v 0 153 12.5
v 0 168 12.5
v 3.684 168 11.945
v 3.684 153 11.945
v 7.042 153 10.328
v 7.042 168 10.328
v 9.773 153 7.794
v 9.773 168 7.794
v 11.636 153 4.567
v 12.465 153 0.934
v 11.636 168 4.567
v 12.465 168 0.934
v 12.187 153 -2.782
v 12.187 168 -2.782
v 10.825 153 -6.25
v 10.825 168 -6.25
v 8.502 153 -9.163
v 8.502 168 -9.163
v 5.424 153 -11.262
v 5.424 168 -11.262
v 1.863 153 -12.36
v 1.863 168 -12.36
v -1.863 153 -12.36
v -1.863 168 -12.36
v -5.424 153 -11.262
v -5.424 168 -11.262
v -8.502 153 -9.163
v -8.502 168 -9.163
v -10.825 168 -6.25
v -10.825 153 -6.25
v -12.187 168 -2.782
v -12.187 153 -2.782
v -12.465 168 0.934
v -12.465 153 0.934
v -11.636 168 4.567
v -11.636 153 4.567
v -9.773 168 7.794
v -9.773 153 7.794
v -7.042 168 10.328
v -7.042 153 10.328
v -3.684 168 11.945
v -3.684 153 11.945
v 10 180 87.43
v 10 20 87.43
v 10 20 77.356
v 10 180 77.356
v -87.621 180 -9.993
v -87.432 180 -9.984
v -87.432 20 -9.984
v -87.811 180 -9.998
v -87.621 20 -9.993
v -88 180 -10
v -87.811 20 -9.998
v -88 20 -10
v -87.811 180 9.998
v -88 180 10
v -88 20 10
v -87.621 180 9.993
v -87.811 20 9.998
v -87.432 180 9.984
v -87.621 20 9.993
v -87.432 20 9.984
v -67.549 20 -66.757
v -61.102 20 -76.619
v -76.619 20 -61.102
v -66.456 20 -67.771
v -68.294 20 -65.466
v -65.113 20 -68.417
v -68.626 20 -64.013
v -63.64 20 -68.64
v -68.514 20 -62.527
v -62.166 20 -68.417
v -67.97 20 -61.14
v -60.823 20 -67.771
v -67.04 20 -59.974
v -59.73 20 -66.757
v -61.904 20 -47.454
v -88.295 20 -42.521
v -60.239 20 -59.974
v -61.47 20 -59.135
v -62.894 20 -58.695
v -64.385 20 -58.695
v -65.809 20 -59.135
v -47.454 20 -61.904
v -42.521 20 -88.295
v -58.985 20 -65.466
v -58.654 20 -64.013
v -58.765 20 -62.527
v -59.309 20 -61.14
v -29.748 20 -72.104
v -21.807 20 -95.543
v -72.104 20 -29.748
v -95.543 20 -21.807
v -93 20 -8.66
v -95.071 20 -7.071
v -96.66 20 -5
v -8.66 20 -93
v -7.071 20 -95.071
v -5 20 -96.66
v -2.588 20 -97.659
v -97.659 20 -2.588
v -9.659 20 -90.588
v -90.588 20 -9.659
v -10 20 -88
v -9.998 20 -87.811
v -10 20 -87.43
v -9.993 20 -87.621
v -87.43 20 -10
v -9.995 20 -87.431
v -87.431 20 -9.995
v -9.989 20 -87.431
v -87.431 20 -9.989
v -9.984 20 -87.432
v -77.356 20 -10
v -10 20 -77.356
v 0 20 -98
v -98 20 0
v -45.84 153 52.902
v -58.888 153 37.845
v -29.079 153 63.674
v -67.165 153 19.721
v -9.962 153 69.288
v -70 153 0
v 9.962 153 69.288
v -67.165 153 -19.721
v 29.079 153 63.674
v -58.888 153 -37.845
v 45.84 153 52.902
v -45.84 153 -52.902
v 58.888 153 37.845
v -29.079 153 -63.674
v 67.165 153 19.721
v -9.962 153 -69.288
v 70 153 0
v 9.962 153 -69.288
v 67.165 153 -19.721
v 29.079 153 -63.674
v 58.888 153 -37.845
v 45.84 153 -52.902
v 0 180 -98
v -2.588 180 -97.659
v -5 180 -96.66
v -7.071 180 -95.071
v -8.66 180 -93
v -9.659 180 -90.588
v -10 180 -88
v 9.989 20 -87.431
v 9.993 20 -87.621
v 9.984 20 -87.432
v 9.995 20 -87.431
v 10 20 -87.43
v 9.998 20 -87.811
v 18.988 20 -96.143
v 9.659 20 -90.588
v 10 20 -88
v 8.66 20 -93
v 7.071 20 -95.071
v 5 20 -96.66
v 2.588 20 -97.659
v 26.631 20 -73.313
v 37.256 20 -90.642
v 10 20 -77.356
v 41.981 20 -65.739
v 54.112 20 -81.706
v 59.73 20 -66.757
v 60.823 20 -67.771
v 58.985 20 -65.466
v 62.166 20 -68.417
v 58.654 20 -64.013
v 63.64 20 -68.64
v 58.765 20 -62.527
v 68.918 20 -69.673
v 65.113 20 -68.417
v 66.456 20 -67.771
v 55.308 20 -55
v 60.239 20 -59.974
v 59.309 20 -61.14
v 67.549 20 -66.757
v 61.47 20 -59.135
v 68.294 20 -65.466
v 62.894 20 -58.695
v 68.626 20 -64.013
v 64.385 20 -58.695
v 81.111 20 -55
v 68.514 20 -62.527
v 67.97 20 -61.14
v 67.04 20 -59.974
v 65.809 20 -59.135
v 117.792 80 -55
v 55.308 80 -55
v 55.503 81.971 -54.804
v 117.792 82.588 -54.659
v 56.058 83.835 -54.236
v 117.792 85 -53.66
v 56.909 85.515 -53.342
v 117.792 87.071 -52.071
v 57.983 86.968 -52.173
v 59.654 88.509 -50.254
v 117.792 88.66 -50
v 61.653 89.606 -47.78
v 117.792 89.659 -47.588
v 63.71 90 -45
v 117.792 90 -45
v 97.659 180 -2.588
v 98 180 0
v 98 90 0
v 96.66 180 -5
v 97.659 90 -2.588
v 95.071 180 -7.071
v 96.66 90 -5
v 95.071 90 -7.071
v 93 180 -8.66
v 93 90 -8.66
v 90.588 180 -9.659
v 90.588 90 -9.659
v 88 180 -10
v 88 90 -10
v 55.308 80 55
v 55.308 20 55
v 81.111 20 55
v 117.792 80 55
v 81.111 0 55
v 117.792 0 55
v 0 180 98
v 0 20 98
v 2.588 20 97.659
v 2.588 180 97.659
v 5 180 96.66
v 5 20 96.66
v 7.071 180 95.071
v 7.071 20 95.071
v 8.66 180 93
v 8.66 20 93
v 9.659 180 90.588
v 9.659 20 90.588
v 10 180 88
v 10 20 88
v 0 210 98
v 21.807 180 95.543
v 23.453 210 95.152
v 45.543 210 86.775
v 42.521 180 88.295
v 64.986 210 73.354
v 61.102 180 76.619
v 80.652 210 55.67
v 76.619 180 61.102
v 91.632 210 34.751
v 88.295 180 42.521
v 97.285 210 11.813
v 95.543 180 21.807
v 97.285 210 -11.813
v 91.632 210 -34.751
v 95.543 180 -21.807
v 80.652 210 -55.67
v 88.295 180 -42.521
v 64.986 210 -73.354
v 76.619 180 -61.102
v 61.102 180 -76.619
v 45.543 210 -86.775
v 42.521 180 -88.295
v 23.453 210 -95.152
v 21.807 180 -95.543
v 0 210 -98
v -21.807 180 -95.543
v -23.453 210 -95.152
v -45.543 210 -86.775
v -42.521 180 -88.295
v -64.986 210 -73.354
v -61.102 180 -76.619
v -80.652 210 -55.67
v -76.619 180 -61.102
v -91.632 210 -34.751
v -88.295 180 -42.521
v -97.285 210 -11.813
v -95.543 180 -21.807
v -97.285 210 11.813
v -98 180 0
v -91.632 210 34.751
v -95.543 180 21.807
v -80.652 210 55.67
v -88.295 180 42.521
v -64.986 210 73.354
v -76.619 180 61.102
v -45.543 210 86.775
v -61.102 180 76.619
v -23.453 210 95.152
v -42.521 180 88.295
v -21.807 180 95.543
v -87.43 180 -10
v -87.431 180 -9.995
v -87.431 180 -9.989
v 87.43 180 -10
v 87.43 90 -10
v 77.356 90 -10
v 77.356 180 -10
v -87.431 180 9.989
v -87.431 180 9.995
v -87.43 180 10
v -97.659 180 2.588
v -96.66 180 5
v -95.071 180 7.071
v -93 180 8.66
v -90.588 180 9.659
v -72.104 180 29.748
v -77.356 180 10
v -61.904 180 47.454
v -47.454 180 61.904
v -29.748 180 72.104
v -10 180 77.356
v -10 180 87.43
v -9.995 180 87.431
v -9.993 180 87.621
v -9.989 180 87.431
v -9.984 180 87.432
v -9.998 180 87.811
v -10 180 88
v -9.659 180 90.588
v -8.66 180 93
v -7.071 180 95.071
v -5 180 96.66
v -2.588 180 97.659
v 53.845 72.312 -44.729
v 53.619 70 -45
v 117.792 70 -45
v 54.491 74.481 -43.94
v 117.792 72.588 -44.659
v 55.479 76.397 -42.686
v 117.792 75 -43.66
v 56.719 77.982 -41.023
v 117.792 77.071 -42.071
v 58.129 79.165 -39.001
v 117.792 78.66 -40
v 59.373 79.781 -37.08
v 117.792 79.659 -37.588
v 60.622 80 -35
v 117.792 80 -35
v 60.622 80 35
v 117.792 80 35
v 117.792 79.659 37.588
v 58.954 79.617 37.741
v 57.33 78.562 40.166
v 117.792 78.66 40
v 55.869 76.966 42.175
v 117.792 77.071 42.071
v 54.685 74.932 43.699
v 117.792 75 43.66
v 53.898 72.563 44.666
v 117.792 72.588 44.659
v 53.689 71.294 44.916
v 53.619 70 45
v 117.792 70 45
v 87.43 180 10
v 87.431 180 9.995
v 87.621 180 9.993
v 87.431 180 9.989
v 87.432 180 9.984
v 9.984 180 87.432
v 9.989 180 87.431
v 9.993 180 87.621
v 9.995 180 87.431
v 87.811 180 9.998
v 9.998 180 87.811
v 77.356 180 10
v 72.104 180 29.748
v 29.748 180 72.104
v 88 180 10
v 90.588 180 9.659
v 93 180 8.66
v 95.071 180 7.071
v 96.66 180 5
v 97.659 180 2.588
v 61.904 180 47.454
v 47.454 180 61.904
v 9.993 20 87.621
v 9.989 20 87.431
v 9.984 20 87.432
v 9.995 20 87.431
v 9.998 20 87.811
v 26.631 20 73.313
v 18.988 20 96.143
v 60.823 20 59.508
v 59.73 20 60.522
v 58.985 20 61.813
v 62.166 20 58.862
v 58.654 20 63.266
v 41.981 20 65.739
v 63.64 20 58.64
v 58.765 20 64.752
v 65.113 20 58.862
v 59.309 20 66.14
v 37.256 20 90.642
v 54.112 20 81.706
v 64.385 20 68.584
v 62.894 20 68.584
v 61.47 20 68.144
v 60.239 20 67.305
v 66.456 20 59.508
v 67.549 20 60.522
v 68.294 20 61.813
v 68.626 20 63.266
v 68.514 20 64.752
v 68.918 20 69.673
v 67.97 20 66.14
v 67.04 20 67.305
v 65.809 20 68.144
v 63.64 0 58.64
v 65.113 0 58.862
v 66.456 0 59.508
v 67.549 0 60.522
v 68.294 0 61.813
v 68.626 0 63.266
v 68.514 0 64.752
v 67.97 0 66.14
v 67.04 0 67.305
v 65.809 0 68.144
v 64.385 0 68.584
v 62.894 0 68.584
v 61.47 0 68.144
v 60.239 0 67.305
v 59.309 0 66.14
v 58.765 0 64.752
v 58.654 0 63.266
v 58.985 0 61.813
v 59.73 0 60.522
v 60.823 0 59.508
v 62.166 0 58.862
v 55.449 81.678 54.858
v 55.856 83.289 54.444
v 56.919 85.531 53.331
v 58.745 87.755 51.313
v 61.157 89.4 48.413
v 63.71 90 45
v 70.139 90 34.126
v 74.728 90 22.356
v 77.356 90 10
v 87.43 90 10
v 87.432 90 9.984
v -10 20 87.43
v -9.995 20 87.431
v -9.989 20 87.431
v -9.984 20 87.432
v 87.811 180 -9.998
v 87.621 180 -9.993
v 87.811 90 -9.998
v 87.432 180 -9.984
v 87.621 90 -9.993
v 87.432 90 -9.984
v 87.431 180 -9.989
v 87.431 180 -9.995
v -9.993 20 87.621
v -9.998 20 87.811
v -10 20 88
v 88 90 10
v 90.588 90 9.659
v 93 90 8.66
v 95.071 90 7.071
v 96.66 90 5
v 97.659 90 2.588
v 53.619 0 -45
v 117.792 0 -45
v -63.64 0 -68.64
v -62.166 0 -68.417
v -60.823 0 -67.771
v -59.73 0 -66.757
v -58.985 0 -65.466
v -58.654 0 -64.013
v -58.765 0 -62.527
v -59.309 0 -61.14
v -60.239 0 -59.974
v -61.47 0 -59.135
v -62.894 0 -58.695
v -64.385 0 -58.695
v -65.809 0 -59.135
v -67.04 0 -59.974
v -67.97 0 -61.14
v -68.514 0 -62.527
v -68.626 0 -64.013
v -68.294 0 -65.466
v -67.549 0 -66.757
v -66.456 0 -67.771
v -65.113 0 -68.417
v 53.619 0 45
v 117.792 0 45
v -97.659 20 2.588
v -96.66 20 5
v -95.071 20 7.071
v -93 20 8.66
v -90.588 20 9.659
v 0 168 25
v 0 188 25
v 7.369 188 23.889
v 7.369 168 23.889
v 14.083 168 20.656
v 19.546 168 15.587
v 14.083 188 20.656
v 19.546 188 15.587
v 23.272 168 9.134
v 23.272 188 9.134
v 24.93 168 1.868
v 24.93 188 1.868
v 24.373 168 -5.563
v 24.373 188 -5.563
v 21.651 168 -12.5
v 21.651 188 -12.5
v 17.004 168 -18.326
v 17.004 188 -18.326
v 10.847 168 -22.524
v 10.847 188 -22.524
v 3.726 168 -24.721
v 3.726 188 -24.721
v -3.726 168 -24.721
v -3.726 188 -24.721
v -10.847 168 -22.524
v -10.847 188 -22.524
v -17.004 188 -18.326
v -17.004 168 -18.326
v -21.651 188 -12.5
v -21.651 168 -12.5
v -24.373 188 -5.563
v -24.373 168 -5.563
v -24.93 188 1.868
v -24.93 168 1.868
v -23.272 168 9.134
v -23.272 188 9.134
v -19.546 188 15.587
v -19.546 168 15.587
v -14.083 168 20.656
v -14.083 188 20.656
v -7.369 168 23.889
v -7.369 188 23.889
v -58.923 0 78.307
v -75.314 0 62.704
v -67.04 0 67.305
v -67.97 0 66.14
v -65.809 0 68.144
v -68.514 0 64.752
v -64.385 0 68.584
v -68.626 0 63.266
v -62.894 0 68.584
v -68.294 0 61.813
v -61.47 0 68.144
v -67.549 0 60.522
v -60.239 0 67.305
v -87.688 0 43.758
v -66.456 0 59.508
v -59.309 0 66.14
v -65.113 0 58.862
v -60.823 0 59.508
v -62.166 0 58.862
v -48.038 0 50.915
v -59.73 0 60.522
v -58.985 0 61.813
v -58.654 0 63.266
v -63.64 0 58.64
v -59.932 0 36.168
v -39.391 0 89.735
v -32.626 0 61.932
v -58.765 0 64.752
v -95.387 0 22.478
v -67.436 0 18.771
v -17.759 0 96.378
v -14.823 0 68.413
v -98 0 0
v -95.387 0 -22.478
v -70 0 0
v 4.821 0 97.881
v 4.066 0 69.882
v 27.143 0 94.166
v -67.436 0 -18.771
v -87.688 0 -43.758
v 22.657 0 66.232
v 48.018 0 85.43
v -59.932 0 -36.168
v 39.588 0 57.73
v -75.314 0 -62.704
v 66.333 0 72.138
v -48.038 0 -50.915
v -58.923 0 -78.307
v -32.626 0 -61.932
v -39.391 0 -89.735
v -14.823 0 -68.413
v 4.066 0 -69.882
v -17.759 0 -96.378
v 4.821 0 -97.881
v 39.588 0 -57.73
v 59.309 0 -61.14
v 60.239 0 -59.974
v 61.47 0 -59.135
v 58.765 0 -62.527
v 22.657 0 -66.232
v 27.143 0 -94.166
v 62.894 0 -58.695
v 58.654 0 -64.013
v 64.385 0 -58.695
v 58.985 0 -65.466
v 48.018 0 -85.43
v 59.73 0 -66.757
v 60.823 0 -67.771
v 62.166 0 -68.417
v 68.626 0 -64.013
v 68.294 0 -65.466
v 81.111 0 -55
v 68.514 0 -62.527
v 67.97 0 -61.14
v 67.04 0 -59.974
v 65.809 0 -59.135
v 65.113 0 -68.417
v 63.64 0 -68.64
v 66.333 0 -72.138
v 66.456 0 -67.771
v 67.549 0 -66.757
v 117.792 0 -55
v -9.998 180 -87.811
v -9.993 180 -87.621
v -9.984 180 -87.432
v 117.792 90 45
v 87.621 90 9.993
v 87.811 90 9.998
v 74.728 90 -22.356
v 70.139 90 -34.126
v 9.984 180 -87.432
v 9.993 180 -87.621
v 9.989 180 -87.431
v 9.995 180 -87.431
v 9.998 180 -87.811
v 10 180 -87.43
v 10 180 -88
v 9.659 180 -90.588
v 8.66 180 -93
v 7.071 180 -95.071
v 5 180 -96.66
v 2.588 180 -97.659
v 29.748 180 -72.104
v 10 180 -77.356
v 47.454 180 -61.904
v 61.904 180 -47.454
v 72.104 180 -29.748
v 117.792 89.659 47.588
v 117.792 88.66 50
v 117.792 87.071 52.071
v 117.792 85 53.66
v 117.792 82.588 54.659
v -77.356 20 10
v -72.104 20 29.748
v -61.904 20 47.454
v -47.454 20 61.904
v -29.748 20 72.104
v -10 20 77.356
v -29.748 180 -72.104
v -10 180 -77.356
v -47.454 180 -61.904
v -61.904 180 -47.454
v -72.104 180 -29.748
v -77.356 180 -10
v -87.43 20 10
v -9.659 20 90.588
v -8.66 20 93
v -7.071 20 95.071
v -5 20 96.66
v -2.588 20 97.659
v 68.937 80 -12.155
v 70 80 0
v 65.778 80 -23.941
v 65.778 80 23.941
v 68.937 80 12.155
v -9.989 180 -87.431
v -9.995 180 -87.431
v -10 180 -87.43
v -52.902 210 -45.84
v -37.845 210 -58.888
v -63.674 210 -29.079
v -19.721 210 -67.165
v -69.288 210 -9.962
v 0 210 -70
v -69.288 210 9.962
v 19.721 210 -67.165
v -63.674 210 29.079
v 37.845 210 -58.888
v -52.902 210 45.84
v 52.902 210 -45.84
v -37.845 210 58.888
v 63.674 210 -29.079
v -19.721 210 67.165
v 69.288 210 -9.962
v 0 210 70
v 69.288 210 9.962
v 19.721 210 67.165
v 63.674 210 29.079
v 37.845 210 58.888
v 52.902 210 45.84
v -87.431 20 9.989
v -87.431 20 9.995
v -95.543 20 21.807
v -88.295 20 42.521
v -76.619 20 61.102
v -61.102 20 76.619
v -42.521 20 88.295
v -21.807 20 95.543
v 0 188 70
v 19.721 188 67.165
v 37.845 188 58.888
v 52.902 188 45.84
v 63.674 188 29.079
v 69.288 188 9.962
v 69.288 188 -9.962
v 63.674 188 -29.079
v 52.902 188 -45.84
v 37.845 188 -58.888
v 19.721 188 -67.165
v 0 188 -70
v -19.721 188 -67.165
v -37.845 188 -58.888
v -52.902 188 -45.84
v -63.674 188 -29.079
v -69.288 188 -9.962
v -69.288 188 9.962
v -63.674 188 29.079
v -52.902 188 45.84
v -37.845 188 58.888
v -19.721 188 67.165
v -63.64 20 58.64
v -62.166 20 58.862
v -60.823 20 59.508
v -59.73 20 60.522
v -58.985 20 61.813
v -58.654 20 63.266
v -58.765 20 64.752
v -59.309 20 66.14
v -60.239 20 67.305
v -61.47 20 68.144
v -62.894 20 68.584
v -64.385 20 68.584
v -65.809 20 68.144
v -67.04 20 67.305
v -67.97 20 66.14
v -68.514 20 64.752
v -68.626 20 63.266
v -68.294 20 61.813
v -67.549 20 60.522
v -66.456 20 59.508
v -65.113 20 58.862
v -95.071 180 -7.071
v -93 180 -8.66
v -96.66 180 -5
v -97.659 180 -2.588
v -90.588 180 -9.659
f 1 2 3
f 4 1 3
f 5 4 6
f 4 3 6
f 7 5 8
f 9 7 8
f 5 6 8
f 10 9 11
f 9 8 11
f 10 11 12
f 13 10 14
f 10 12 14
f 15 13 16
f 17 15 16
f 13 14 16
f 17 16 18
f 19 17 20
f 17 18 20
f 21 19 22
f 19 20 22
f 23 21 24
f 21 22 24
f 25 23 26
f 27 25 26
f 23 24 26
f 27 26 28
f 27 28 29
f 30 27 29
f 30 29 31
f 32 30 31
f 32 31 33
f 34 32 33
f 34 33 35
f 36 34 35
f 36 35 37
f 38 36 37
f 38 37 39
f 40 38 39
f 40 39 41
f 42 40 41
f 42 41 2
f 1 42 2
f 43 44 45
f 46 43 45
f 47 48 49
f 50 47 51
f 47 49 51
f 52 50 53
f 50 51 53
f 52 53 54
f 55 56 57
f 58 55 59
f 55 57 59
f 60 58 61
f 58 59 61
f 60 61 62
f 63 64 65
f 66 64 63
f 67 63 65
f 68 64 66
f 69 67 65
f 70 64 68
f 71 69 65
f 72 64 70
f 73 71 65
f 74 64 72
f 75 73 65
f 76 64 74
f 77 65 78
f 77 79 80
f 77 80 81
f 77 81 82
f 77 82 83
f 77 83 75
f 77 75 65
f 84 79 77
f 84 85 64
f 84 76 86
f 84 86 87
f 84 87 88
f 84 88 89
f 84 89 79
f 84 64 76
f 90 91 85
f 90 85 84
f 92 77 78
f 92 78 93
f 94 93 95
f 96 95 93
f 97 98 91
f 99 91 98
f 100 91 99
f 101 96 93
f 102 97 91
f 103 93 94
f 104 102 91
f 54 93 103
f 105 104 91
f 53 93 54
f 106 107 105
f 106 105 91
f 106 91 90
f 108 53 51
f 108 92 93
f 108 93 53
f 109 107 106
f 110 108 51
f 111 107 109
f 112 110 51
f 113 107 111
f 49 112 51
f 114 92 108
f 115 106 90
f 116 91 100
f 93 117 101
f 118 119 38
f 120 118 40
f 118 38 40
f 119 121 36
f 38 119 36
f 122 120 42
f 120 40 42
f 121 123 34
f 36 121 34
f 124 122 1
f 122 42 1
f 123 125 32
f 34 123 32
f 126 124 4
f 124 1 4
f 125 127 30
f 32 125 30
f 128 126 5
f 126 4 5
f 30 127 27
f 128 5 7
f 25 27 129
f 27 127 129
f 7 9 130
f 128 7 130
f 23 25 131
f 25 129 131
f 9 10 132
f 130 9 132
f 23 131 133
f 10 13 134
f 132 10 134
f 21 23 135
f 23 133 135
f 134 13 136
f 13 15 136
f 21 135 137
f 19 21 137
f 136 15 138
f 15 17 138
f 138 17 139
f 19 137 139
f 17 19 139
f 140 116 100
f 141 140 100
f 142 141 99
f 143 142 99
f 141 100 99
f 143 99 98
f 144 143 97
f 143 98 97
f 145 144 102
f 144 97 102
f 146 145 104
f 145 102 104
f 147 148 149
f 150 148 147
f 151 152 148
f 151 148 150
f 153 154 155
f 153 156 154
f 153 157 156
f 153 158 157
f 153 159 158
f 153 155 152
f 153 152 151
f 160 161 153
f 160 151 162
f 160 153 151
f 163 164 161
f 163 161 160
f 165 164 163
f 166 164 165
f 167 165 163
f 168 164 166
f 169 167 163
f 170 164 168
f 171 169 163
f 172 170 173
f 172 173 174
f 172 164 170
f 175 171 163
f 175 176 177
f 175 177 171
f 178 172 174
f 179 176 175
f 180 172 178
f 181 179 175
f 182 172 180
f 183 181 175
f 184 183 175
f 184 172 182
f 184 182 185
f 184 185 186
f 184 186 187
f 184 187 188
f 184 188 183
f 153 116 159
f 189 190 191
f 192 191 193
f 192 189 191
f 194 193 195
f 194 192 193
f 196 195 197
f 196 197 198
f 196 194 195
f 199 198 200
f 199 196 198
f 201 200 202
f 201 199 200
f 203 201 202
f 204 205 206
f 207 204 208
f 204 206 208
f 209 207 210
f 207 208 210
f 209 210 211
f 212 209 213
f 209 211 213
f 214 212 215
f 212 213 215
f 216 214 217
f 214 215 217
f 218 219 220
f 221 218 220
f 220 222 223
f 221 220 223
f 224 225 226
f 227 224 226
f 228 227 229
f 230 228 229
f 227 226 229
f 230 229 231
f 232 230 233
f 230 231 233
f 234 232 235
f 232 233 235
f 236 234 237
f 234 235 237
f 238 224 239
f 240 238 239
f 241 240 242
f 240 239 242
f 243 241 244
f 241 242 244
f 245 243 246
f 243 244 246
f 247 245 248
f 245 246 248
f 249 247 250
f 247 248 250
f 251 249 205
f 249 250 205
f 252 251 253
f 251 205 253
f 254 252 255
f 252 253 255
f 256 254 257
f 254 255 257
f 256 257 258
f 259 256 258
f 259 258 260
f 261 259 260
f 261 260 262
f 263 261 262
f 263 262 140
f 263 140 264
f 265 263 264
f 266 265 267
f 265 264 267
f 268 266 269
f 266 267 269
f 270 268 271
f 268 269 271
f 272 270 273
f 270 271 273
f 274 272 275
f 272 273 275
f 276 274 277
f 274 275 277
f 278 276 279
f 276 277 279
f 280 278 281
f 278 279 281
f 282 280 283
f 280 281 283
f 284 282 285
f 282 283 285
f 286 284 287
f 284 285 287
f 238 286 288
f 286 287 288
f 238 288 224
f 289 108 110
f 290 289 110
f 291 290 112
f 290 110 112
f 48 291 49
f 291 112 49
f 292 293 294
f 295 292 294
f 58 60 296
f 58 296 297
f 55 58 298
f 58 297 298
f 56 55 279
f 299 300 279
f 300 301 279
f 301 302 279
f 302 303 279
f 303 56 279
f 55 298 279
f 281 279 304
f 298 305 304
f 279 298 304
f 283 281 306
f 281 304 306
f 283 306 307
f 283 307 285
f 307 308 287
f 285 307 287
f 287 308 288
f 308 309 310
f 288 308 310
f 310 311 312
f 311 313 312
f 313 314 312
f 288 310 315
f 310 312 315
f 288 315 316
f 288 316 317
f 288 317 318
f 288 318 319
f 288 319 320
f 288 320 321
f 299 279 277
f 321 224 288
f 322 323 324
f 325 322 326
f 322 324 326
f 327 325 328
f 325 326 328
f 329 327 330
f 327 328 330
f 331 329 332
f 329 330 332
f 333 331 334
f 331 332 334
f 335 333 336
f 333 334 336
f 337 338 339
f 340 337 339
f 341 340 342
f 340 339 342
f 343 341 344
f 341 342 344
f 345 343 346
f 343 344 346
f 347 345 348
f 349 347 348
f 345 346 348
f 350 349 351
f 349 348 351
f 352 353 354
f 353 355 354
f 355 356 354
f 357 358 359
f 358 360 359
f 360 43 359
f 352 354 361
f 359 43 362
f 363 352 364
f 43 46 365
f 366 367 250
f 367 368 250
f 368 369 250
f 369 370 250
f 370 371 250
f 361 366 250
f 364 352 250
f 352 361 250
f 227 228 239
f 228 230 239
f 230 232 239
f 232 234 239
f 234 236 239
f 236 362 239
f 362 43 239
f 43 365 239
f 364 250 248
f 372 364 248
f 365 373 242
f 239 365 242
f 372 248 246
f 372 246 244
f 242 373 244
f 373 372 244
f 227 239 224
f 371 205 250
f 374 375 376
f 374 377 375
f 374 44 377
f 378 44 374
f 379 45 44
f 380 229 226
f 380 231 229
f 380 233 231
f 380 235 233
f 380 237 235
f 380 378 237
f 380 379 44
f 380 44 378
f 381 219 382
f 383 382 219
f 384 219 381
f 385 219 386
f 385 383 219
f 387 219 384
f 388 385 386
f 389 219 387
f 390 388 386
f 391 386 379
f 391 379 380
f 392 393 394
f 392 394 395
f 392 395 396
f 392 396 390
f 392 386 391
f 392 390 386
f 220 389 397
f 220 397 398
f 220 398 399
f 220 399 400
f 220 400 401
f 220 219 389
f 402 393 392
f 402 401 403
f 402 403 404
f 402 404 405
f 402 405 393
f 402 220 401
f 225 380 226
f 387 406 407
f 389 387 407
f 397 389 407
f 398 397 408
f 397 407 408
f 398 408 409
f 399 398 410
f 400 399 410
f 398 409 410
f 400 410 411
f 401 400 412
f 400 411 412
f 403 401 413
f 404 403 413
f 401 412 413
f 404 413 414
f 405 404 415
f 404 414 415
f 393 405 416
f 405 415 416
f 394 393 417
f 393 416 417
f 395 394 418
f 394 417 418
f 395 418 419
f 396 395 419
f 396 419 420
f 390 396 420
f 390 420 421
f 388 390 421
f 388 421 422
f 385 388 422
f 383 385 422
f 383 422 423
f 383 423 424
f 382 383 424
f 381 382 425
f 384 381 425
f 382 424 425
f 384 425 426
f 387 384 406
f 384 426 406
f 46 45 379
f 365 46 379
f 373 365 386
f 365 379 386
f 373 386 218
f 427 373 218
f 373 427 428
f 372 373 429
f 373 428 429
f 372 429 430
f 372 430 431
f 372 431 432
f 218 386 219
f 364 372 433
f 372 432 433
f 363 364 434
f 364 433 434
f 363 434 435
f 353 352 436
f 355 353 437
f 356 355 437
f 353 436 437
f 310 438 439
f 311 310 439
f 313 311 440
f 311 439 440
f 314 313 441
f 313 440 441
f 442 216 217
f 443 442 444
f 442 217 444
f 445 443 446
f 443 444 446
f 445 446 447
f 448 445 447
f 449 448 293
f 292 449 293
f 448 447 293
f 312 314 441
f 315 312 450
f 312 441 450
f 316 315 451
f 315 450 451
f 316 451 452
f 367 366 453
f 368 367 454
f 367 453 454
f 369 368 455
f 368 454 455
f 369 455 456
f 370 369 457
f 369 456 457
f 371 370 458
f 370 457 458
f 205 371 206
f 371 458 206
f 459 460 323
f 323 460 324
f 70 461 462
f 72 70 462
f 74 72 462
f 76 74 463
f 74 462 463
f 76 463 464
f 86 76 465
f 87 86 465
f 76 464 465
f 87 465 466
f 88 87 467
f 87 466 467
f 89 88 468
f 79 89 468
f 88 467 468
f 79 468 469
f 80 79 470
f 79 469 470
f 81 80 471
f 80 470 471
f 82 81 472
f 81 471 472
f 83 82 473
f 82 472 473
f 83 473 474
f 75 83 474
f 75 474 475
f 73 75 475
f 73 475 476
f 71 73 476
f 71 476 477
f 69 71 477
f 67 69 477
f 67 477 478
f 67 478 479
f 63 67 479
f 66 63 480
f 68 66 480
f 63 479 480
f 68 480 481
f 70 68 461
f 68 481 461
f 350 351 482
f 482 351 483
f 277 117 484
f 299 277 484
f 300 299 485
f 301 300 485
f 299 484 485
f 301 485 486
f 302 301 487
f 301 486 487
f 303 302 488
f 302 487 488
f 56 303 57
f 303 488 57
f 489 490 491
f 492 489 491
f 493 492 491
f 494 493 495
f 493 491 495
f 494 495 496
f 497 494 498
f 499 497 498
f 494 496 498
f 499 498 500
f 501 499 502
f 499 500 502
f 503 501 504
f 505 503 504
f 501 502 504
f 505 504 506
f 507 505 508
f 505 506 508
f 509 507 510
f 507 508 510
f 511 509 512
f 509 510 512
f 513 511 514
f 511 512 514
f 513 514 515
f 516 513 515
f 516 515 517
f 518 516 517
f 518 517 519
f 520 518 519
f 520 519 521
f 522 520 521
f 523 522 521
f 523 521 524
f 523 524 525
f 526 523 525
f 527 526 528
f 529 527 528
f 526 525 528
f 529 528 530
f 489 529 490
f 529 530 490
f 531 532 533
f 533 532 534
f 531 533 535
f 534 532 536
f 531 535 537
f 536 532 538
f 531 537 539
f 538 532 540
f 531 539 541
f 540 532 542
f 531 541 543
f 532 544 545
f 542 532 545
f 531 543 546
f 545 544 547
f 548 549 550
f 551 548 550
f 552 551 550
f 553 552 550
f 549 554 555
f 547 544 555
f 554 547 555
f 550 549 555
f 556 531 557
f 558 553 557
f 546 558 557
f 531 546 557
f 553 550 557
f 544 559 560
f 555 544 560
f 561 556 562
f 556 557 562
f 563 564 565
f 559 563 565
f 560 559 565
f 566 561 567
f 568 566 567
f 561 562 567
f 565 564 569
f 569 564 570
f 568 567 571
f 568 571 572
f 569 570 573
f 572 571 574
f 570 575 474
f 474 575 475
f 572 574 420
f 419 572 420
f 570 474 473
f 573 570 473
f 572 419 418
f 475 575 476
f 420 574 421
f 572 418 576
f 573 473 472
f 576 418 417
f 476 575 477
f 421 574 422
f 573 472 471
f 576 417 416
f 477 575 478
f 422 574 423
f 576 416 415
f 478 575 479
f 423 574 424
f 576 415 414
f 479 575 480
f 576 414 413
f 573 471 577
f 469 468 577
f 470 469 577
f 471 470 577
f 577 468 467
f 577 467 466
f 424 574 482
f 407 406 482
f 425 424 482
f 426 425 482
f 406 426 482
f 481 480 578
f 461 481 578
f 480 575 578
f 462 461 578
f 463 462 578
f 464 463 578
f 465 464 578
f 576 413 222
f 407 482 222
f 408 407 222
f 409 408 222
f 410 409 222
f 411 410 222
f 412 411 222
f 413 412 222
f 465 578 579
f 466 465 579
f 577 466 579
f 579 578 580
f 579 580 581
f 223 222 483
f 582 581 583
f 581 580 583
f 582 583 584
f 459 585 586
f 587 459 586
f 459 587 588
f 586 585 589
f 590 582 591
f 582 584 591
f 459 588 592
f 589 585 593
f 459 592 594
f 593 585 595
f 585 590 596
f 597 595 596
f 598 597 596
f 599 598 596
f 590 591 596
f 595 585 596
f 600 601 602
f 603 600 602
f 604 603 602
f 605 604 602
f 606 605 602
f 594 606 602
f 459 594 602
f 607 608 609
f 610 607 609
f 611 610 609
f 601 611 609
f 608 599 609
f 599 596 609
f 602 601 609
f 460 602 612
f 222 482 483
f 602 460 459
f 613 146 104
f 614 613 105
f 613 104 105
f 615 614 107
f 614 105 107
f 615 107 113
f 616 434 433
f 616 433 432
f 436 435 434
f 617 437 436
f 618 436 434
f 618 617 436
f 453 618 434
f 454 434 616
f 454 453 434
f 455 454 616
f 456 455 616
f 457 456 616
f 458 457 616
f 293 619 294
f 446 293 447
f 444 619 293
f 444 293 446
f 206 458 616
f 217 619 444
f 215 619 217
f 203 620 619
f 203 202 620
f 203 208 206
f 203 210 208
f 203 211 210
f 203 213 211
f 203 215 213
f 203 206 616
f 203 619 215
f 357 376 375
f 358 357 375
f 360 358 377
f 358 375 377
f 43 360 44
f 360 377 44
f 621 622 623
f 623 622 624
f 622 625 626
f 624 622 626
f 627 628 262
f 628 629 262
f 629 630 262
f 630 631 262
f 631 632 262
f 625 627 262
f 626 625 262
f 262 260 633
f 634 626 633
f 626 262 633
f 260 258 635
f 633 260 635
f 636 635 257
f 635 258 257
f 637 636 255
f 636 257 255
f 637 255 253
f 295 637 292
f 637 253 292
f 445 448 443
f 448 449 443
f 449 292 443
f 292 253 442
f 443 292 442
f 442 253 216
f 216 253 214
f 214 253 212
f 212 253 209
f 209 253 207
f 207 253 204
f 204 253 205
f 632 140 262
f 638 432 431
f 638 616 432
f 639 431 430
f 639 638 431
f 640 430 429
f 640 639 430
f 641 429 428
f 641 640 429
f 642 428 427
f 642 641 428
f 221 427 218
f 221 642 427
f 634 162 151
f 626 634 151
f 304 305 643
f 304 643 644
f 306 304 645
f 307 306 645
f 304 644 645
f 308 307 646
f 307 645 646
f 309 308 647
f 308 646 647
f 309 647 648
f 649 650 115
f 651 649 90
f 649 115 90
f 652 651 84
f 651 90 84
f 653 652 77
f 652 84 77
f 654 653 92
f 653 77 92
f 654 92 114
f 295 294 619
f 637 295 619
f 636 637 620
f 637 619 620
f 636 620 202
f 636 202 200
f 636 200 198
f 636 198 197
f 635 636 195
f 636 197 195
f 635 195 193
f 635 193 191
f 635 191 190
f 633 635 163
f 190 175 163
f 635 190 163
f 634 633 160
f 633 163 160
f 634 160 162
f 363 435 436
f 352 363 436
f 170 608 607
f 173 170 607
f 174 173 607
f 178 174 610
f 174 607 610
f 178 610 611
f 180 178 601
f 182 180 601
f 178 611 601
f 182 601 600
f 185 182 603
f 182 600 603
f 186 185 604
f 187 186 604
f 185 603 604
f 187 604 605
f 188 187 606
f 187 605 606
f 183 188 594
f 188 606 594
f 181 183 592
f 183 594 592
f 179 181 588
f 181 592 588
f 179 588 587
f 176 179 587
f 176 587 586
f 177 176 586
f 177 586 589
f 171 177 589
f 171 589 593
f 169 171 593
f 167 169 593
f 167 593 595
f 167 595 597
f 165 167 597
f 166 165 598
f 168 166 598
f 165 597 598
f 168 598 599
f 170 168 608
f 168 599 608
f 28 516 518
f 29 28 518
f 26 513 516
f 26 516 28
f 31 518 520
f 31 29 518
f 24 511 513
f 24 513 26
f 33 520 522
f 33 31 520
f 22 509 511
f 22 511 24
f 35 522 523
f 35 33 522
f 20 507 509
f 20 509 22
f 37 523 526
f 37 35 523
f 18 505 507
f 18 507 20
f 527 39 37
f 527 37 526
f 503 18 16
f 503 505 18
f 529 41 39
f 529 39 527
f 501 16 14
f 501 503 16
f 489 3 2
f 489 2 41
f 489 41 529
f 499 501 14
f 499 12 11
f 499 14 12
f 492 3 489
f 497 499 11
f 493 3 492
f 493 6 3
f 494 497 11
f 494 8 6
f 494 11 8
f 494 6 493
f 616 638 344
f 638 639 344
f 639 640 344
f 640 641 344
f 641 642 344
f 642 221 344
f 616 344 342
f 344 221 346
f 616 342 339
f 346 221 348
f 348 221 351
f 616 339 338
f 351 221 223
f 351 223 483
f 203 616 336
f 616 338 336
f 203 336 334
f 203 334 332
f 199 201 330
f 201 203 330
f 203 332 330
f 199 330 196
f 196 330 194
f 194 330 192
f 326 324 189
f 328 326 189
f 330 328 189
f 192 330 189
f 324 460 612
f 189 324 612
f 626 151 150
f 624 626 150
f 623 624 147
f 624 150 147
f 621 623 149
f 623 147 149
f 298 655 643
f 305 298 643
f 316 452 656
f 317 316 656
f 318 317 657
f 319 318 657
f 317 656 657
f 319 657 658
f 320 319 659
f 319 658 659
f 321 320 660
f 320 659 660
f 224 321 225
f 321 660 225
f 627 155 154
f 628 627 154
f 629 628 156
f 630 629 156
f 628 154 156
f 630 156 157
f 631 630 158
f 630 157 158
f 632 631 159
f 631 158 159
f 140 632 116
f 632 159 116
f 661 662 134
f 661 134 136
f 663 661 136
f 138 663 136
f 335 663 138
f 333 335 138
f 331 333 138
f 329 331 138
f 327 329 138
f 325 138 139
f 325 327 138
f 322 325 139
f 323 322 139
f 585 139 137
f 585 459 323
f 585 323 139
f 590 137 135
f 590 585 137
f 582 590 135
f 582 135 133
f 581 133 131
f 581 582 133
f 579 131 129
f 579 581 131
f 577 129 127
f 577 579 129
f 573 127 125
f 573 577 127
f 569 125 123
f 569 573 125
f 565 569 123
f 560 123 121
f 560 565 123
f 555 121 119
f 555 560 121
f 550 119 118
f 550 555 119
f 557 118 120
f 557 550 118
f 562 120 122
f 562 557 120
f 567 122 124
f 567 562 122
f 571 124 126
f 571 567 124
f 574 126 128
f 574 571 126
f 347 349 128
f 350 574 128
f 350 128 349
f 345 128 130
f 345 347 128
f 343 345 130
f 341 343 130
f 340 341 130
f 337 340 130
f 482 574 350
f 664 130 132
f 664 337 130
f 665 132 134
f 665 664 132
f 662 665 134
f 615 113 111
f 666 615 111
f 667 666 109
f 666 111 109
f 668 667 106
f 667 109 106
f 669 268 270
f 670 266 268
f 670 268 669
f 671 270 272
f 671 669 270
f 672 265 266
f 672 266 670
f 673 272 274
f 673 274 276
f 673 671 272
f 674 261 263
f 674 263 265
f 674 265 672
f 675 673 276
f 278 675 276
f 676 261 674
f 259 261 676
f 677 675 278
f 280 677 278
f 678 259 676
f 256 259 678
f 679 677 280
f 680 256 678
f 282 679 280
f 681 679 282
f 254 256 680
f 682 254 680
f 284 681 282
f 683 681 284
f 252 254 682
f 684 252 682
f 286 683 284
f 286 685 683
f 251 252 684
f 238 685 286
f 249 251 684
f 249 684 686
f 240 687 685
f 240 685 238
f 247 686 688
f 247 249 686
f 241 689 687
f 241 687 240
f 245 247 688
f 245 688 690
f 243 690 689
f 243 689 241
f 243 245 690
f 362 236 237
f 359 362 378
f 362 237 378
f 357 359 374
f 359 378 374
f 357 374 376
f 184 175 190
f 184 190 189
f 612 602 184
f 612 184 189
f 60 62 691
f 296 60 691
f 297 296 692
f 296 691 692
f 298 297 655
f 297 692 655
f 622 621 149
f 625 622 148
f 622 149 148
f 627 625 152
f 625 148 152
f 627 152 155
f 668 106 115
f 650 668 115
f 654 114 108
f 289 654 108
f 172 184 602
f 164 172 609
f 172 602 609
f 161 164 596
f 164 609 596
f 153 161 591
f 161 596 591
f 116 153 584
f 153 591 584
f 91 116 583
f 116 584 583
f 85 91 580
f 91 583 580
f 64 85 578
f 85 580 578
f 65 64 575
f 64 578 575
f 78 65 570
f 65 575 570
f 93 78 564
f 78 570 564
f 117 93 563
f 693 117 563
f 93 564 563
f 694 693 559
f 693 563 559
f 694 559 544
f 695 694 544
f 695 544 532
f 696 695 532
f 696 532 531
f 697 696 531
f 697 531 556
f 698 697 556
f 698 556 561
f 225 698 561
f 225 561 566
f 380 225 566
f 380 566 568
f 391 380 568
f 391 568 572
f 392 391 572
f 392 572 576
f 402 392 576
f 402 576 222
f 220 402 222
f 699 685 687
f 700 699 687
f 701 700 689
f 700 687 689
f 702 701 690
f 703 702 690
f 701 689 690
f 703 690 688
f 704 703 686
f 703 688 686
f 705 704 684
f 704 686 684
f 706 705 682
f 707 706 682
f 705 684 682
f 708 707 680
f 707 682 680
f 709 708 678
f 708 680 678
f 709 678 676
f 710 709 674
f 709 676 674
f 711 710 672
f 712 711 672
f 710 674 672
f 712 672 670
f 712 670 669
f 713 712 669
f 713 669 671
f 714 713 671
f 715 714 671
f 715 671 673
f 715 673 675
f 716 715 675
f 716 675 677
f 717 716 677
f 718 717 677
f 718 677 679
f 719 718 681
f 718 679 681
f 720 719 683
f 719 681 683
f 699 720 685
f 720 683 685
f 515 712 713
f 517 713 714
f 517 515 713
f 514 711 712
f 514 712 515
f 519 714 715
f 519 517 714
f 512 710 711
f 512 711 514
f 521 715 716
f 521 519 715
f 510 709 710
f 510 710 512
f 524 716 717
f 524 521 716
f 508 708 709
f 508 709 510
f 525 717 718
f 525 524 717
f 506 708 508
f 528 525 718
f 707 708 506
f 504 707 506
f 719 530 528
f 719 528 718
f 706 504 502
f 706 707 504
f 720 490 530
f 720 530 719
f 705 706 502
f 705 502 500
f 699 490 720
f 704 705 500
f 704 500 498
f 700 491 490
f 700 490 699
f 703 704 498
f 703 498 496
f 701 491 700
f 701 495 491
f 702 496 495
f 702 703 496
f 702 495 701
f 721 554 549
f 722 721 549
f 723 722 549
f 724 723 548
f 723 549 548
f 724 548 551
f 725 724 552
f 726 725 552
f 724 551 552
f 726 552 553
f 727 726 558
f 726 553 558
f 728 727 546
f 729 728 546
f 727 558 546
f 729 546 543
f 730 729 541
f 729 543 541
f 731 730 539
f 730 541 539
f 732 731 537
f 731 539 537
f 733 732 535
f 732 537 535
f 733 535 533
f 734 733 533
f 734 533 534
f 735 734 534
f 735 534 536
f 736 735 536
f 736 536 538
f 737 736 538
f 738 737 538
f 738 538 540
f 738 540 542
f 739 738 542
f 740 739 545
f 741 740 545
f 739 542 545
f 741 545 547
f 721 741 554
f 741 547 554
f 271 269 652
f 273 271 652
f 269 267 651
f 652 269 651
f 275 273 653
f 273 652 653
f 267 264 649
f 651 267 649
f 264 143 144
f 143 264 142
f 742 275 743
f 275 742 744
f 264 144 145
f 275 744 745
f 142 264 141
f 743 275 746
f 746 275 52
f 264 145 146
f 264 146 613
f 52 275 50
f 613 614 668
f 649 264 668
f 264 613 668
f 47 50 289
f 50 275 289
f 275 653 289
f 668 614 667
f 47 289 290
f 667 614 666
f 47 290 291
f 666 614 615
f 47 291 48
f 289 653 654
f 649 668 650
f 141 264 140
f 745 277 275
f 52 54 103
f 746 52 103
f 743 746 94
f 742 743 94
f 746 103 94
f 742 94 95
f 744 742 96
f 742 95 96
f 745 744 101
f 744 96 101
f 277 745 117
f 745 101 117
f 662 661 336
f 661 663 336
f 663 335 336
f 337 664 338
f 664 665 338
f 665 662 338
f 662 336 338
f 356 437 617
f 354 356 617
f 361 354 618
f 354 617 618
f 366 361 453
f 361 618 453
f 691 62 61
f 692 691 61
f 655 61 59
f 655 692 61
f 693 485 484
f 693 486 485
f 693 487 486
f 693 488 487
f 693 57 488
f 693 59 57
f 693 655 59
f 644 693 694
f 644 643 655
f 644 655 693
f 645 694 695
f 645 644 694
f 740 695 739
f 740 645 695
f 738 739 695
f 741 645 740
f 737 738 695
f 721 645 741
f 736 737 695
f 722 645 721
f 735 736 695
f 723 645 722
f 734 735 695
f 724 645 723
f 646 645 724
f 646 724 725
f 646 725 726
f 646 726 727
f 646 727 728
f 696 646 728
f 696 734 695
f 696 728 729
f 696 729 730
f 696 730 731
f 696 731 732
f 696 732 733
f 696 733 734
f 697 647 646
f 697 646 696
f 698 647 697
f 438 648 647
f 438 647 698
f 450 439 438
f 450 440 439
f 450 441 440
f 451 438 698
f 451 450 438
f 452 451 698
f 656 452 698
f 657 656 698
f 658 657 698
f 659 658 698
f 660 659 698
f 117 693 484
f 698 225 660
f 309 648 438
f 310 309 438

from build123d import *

# Parameters (mm, degrees)
SKETCH1_R               = 98
SKETCH1_R_2             = 78
BOSS_EXTRUDE1_DEPTH     = 20
SKETCH1_3_R             = 78
BOSS_EXTRUDE2_DEPTH     = 210
BOSS_EXTRUDE3_DEPTH     = 160
CIRPATTERN1_COUNT       = 4
BOSS_EXTRUDE4_START     = -30
SKETCH3_R               = 98
SKETCH3_R_2             = 78
BOSS_EXTRUDE4_DEPTH     = 30
SKETCH4_R               = 70
CUT_EXTRUDE1_DEPTH      = 22
SKETCH5_R               = 25
CUT_EXTRUDE2_DEPTH      = 20
CUT_EXTRUDE3_START      = -188
CUT_EXTRUDE3_OUTLINE_R  = 70
CUT_EXTRUDE3_DEPTH      = 153
SKETCH7_R               = 12.5
CUT_EXTRUDE4_DEPTH      = 218.788888605
BOSS_EXTRUDE6_DEPTH     = 90
FILLET1_R               = 10
CUT_EXTRUDE5_REACH      = 318.655
CUT_EXTRUDE5_END_RADIUS = 70
SKETCH12_R              = 5
CUT_EXTRUDE6_DEPTH      = 20


# Read off the part's stored shape, not the designer's step: Cut-Extrude3
with BuildPart() as part:
    # Sketch1 → Boss-Extrude1 (new body)
    # profile 1 of 2: a face of its own
    with BuildSketch(Plane(origin=(0, 0, 0), x_dir=(1, 0, 0), z_dir=(0, 1, 0))):
        with Locations(Location((0, 0, 0), (0, 0, 270))):
            Circle(SKETCH1_R)
        Circle(SKETCH1_R_2, mode=Mode.SUBTRACT)
    # profile 2 of 2: a face of its own
    with BuildSketch(Plane(origin=(0, 0, 0), x_dir=(1, 0, 0), z_dir=(0, 1, 0))):
        Circle(SKETCH1_R_2)
    extrude(amount=BOSS_EXTRUDE1_DEPTH)

    # Sketch1<3> → Boss-Extrude2 (add)
    with BuildSketch(Plane(origin=(0, 0, 0), x_dir=(1, 0, 0), z_dir=(0, 1, 0))):
        with Locations(Location((0, 0, 0), (0, 0, 270))):
            Circle(SKETCH1_3_R)
    extrude(amount=BOSS_EXTRUDE2_DEPTH)

    # Sketch2 → Boss-Extrude3 (add)
    with BuildSketch(Plane(origin=(0, 20, 0), x_dir=(1, 0, 0), z_dir=(0, 1, 0))):
        with BuildLine():
            ThreePointArc((9.983845423, -87.431818182), (6.867247692, -80.730824728), (-9e-09, -78))
            Line((0, -78), (0, -88))
            ThreePointArc((0, -88), (5, -87.857839718), (9.983845423, -87.431818182))
        make_face()
        with BuildLine():
            Line((0, -88), (0, -78))
            ThreePointArc((-9e-09, -78), (-6.867247699, -80.730824734), (-9.983845423, -87.431818182))
            ThreePointArc((-9.983845423, -87.431818182), (-5, -87.857839718), (0, -88))
        make_face()
        with BuildLine():
            ThreePointArc((9.983845423, -87.431818182), (5, -87.857839718), (0, -88))
            Line((0, -88), (0, -98))
            ThreePointArc((0, -98), (7.071067812, -95.071067812), (10, -88))
            ThreePointArc((10, -88), (9.99596054, -87.715794287), (9.983845423, -87.431818182))
        make_face()
        with BuildLine():
            Line((0, -98), (0, -88))
            ThreePointArc((0, -88), (-5, -87.857839718), (-9.983845423, -87.431818182))
            ThreePointArc((-9.983845423, -87.431818182), (-9.99596054, -87.715794287), (-10, -88))
            ThreePointArc((-10, -88), (-7.071067812, -95.071067812), (0, -98))
        make_face()
        with BuildLine():
            ThreePointArc((-9.983845423, -87.431818182), (-6.867247699, -80.730824734), (-9e-09, -78))
            ThreePointArc((-9e-09, -78), (-5.010347447, -77.838913266), (-10, -77.356318423))
            Line((-10, -77.356318423), (-10, -87.429971978))
            ThreePointArc((-10, -87.429971978), (-9.991922754, -87.430895453), (-9.983845423, -87.431818182))
        make_face()
        with BuildLine():
            ThreePointArc((10, -77.356318423), (5.010347438, -77.838913267), (-9e-09, -78))
            ThreePointArc((-9e-09, -78), (6.867247692, -80.730824728), (9.983845423, -87.431818182))
            ThreePointArc((9.983845423, -87.431818182), (9.991922754, -87.430895453), (10, -87.429971978))
            Line((10, -87.429971978), (10, -77.356318423))
        make_face()
    boss_extrude3 = extrude(amount=BOSS_EXTRUDE3_DEPTH)

    # CirPattern1: Boss-Extrude3 ×4 about axis
    cirpattern1_axis = Axis((0, 0, 0), (0, 1, 0))
    for i in range(1, CIRPATTERN1_COUNT):
        add(boss_extrude3.rotate(cirpattern1_axis, i * 360 / CIRPATTERN1_COUNT))

    # Sketch3 → Boss-Extrude4 (add)
    with BuildSketch(Plane(origin=(0, 210, 0), x_dir=(1, 0, 0), z_dir=(0, 1, 0)).offset(BOSS_EXTRUDE4_START)):
        with Locations(Location((0, 0, 0), (0, 0, 270))):
            Circle(SKETCH3_R)
        Circle(SKETCH3_R_2, mode=Mode.SUBTRACT)
    extrude(amount=BOSS_EXTRUDE4_DEPTH)

    # Sketch4 → Cut-Extrude1 (cut)
    with BuildSketch(Plane(origin=(0, 210, 0), x_dir=(1, 0, 0), z_dir=(0, 1, 0))):
        with Locations(Location((0, 0, 0), (0, 0, 270))):
            Circle(SKETCH4_R)
    extrude(amount=-CUT_EXTRUDE1_DEPTH, mode=Mode.SUBTRACT)

    # Sketch5 → Cut-Extrude2 (cut)
    with BuildSketch(Plane(origin=(0, 188, 0), x_dir=(1, 0, 0), z_dir=(0, 1, 0))):
        with Locations(Location((0, 0, 0), (0, 0, 270))):
            Circle(SKETCH5_R)
    extrude(amount=-CUT_EXTRUDE2_DEPTH, mode=Mode.SUBTRACT)

    # Cut-Extrude3 outline → Cut-Extrude3 (cut)
    with BuildSketch(Plane(origin=(0, 188, 0), x_dir=(1, 0, 0), z_dir=(0, 1, 0)).offset(CUT_EXTRUDE3_START)):
        Circle(CUT_EXTRUDE3_OUTLINE_R)
    extrude(amount=CUT_EXTRUDE3_DEPTH, mode=Mode.SUBTRACT)

    # Sketch7 → Cut-Extrude4 (cut, through all)
    with BuildSketch(Plane(origin=(0, 168, 0), x_dir=(1, 0, 0), z_dir=(0, 1, 0))):
        with Locations(Location((0, 0, 0), (0, 0, 270))):
            Circle(SKETCH7_R)
    extrude(amount=-CUT_EXTRUDE4_DEPTH, mode=Mode.SUBTRACT)

    # Sketch10 → Boss-Extrude6 (add)
    with BuildSketch(Plane.XZ):
        with BuildLine():
            Line((117.792189894, 0), (98, 0))
            ThreePointArc((98, 0), (93.68265963, -28.767330162), (81.111035008, -55))
            Line((81.111035008, -55), (117.792189894, -55))
            Line((117.792189894, -55), (117.792189894, 0))
        make_face()
        with BuildLine():
            ThreePointArc((81.111035008, -55), (93.68265963, -28.767330162), (98, 0))
            ThreePointArc((98, 0), (94.867247695, -7.269175269), (87.431818182, -9.983845423))
            Line((87.431818182, -9.983845423), (87.429971978, -10))
            Line((87.429971978, -10), (77.356318423, -10))
            ThreePointArc((77.356318423, -10), (70.04441747, -34.318793412), (55.308227236, -55))
            Line((55.308227236, -55), (81.111035008, -55))
        make_face()
    boss_extrude6 = extrude(amount=-BOSS_EXTRUDE6_DEPTH)

    # Mirror1: Boss-Extrude6 across plane
    add(boss_extrude6.mirror(Plane.XY))

    # Fillet1
    fillet1_edges = [part.edges().sort_by_distance(p)[0] for p in [
        (86.550208565, 90, -55),
        (86.550208565, 90, 55),
    ]]
    fillet(fillet1_edges, radius=FILLET1_R)

    # Cut-Extrude5: up to this cylinder (the profile starts outside it)
    cut_extrude5_end = Plane(origin=(0, 39.773519, 0), z_dir=(0, 1, 0)) * Cylinder(CUT_EXTRUDE5_END_RADIUS, 778.31, mode=Mode.PRIVATE)
    # Sketch11 → Cut-Extrude5 (cut, up to the surface)
    with BuildSketch(Plane(origin=(117.792189894, 0, 0), x_dir=(0, 0, -1), z_dir=(1, 0, 0)), mode=Mode.PRIVATE) as cut_extrude5_sk1:
        with BuildLine():
            Line((-45, 0), (45, 0))
            Line((45, 0), (45, 70))
            ThreePointArc((45, 70), (42.071067812, 77.071067812), (35, 80))
            Line((35, 80), (-35, 80))
            ThreePointArc((-35, 80), (-42.071067812, 77.071067812), (-45, 70))
            Line((-45, 70), (-45, 0))
        make_face()
    cut_extrude5_tool1 = extrude(cut_extrude5_sk1.sketch, amount=-CUT_EXTRUDE5_REACH, mode=Mode.PRIVATE) - cut_extrude5_end
    add(cut_extrude5_tool1.solids().sort_by_distance((117.79219, 39.773519, 0))[0], mode=Mode.SUBTRACT)

    # Sketch12 → Cut-Extrude6 (cut)
    with BuildSketch(Plane.XZ):
        with Locations(Location((-63.639610307, 63.639610307, 0), (0, 0, 270))):
            Circle(SKETCH12_R)
        with Locations(Location((63.639610307, 63.639610307, 0), (0, 0, 270))):
            Circle(SKETCH12_R)
        with Locations(Location((63.639610307, -63.639610307, 0), (0, 0, 270))):
            Circle(SKETCH12_R)
        with Locations(Location((-63.639610307, -63.639610307, 0), (0, 0, 270))):
            Circle(SKETCH12_R)
    extrude(amount=-CUT_EXTRUDE6_DEPTH, mode=Mode.SUBTRACT)


solid = part.part
